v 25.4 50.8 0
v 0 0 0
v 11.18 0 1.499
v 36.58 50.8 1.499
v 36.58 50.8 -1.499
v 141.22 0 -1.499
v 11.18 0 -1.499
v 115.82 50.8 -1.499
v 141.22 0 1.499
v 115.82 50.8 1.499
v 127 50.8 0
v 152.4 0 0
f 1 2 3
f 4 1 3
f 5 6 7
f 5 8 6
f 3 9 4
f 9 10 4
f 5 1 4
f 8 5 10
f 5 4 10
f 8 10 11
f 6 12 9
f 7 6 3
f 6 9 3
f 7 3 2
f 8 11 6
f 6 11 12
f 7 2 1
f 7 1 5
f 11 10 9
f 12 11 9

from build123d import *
from OCP.BRepFilletAPI import BRepFilletAPI_MakeChamfer

# Parameters (mm, degrees)
BOSS_EXTRUDE1_DEPTH = 1.4986
CHAMFER1_SIZE       = 1.4986
CHAMFER1_SIZE_2     = 10
CHAMFER2_SIZE       = 10
CHAMFER2_SIZE_2     = 1.4986


# Some blends are built 0.0001 mm under size
with BuildPart() as part:
    # Sketch1 → Boss-Extrude1 (new, symmetric)
    with BuildSketch(Plane.XY):
        Polygon((0, 0), (25.4, 50.8), (127, 50.8), (152.4, 0), align=None)
    extrude(amount=BOSS_EXTRUDE1_DEPTH, both=True)

    # Chamfer1
    # the kernel refuses this chamfer: 10, 1.4986 mm, written as the material it takes off along each edge
    with BuildSketch(Plane(origin=(-11.62280373, -23.24560746, -1.4986), x_dir=(-0.22013014518345764, 0.11006507259172885, 0.9692411459368031), z_dir=(0.4472135954999581, 0.8944271909999159, 0))) as chamfer1_piece_1:
        Polygon((CHAMFER1_SIZE * 0.969241145937, CHAMFER1_SIZE * 0.246112984264), (-CHAMFER1_SIZE_2 * 0.246112984264, CHAMFER1_SIZE_2 * 0.969241145937), (0, 0), align=None)
    extrude(amount=108.774885087, mode=Mode.SUBTRACT)
    with BuildSketch(Plane(origin=(-11.62280373, -23.24560746, 1.4986), x_dir=(-0.22013014518345764, 0.11006507259172885, -0.9692411459368031), z_dir=(0.4472135954999581, 0.8944271909999159, 0))) as chamfer1_piece_2:
        Polygon((CHAMFER1_SIZE * 0.969241145937, -CHAMFER1_SIZE * 0.246112984264), (-CHAMFER1_SIZE_2 * 0.246112984264, -CHAMFER1_SIZE_2 * 0.969241145937), (0, 0), align=None)
    extrude(amount=108.774885087, mode=Mode.SUBTRACT)

    # Chamfer2
    chamfer2_edges_1 = [part.edges().sort_by_distance(p)[0] for p in [
        (139.7, 25.4, -1.4986),
    ]]
    chamfer2_side_1 = [part.faces().sort_by_distance(p)[0] for p in [
        (139.673192228, 25.386596114, -1.4986),
    ]]
    chamfer2_edges_2 = [part.edges().sort_by_distance(p)[0] for p in [
        (139.7, 25.4, 1.4986),
    ]]
    chamfer2_side_2 = [part.faces().sort_by_distance(p)[0] for p in [
        (139.7, 25.4, 1.468628),
    ]]
    chamfer2 = BRepFilletAPI_MakeChamfer(part.part.solid().wrapped)
    for e in chamfer2_edges_1:
        chamfer2.Add(CHAMFER2_SIZE - 0.0001, CHAMFER2_SIZE_2 - 0.0001, e.wrapped, chamfer2_side_1[0].wrapped)
    for e in chamfer2_edges_2:
        chamfer2.Add(CHAMFER2_SIZE_2 - 0.0001, CHAMFER2_SIZE - 0.0001, e.wrapped, chamfer2_side_2[0].wrapped)
    add(Compound.cast(chamfer2.Shape()), mode=Mode.REPLACE)  # a hair under: the kernel refuses the full size


solid = part.part
